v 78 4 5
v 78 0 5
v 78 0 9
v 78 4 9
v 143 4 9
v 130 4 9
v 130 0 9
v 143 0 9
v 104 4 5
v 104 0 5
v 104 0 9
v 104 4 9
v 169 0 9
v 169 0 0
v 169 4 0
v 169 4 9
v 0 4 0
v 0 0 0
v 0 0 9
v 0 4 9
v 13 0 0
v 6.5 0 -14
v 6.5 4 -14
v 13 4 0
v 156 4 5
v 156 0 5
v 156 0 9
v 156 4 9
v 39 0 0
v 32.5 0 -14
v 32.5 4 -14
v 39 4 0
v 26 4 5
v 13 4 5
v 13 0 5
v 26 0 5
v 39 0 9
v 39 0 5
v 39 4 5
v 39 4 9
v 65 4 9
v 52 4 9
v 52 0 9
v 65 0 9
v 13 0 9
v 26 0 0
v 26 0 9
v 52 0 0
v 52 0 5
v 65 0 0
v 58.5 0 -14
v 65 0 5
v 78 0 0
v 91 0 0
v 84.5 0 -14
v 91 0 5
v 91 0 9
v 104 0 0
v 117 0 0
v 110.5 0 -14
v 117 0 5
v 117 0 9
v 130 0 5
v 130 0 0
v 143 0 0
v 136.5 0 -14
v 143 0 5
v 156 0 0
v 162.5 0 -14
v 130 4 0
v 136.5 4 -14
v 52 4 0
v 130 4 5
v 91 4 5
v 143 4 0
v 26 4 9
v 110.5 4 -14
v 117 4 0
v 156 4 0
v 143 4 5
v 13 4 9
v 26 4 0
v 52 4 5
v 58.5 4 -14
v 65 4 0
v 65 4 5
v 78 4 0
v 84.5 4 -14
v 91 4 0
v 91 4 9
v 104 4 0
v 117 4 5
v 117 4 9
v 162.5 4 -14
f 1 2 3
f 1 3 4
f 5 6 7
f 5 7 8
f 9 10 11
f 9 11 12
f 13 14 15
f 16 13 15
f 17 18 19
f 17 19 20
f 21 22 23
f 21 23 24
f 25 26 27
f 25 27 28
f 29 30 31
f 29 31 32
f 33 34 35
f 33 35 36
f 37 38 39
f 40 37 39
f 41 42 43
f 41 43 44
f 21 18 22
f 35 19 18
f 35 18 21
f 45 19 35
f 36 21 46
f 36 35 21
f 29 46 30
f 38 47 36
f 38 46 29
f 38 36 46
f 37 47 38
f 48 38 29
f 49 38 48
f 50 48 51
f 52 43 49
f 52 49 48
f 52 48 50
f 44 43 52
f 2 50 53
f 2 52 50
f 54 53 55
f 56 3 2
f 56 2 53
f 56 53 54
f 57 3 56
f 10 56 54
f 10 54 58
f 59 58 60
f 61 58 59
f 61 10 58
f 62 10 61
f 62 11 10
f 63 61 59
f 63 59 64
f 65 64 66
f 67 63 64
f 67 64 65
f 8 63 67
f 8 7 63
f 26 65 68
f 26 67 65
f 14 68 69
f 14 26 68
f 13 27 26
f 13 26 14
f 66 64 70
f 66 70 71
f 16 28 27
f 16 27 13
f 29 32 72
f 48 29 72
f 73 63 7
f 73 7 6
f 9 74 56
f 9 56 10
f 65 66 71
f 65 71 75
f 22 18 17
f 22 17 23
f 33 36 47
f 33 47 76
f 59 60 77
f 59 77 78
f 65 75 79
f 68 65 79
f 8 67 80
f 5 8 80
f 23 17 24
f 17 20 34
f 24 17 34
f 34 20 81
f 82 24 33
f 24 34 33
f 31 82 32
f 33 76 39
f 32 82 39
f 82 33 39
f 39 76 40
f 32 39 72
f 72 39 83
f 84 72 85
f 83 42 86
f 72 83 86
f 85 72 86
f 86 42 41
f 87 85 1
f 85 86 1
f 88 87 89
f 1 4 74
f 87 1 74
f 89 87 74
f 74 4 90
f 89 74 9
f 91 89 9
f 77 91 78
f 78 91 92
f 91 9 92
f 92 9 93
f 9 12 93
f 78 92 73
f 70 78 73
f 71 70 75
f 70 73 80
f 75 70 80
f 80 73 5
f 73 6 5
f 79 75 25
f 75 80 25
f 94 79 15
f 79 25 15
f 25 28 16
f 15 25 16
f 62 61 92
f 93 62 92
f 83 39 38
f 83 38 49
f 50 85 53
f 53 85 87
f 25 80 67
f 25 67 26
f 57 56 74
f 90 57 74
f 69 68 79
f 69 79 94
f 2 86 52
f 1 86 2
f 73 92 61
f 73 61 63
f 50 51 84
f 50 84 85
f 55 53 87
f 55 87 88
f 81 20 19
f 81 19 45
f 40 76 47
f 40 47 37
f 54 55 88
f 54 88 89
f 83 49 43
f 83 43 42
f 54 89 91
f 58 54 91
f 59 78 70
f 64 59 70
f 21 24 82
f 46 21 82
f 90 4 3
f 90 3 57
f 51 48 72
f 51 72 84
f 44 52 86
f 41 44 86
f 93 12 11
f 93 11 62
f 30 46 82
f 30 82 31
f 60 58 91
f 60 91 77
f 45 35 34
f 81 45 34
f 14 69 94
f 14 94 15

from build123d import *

# Parameters (mm, degrees)
F0_W     = 13
F0_H     = 4
F1_DEPTH = 5
F2_DEPTH = 9
F4_DEPTH = 4


with BuildPart() as f1:
    # F0 (on Top) → F1 (new body)
    with BuildSketch(Plane.XY):
        with Locations((6.5, 2)):
            Rectangle(F0_W, F0_H)
        with Locations((19.5, 2)):
            Rectangle(F0_W, F0_H)
        with Locations((32.5, 2)):
            Rectangle(F0_W, F0_H)
        with Locations((45.5, 2)):
            Rectangle(F0_W, F0_H)
        with Locations((58.5, 2)):
            Rectangle(F0_W, F0_H)
        with Locations((71.5, 2)):
            Rectangle(F0_W, F0_H)
        with Locations((84.5, 2)):
            Rectangle(F0_W, F0_H)
        with Locations((97.5, 2)):
            Rectangle(F0_W, F0_H)
        with Locations((110.5, 2)):
            Rectangle(F0_W, F0_H)
        with Locations((123.5, 2)):
            Rectangle(F0_W, F0_H)
        with Locations((136.5, 2)):
            Rectangle(F0_W, F0_H)
        with Locations((149.5, 2)):
            Rectangle(F0_W, F0_H)
        with Locations((162.5, 2)):
            Rectangle(F0_W, F0_H)
    extrude(amount=F1_DEPTH)

    # F0 (on Top) → F2 (join)
    with BuildSketch(Plane.XY):
        with Locations((6.5, 2)):
            Rectangle(F0_W, F0_H)
        with Locations((32.5, 2)):
            Rectangle(F0_W, F0_H)
        with Locations((58.5, 2)):
            Rectangle(F0_W, F0_H)
        with Locations((84.5, 2)):
            Rectangle(F0_W, F0_H)
        with Locations((110.5, 2)):
            Rectangle(F0_W, F0_H)
        with Locations((136.5, 2)):
            Rectangle(F0_W, F0_H)
        with Locations((162.5, 2)):
            Rectangle(F0_W, F0_H)
    extrude(amount=F2_DEPTH)

    # F3 (on face) → F4 (join)
    with BuildSketch(Plane.XZ):
        Polygon((13, 0), (0, 0), (6.5, -14), align=None)
        Polygon((39, 0), (26, 0), (32.5, -14), align=None)
        Polygon((65, 0), (52, 0), (58.5, -14), align=None)
        Polygon((91, 0), (78, 0), (84.5, -14), align=None)
        Polygon((117, 0), (104, 0), (110.5, -14), align=None)
        Polygon((143, 0), (130, 0), (136.5, -14), align=None)
        Polygon((162.5, 0), (156, 0), (162.5, -14), align=None)
        Polygon((162.5, 0), (162.5, -14), (169, 0), align=None)
    extrude(amount=-F4_DEPTH)


solid = f1.part
